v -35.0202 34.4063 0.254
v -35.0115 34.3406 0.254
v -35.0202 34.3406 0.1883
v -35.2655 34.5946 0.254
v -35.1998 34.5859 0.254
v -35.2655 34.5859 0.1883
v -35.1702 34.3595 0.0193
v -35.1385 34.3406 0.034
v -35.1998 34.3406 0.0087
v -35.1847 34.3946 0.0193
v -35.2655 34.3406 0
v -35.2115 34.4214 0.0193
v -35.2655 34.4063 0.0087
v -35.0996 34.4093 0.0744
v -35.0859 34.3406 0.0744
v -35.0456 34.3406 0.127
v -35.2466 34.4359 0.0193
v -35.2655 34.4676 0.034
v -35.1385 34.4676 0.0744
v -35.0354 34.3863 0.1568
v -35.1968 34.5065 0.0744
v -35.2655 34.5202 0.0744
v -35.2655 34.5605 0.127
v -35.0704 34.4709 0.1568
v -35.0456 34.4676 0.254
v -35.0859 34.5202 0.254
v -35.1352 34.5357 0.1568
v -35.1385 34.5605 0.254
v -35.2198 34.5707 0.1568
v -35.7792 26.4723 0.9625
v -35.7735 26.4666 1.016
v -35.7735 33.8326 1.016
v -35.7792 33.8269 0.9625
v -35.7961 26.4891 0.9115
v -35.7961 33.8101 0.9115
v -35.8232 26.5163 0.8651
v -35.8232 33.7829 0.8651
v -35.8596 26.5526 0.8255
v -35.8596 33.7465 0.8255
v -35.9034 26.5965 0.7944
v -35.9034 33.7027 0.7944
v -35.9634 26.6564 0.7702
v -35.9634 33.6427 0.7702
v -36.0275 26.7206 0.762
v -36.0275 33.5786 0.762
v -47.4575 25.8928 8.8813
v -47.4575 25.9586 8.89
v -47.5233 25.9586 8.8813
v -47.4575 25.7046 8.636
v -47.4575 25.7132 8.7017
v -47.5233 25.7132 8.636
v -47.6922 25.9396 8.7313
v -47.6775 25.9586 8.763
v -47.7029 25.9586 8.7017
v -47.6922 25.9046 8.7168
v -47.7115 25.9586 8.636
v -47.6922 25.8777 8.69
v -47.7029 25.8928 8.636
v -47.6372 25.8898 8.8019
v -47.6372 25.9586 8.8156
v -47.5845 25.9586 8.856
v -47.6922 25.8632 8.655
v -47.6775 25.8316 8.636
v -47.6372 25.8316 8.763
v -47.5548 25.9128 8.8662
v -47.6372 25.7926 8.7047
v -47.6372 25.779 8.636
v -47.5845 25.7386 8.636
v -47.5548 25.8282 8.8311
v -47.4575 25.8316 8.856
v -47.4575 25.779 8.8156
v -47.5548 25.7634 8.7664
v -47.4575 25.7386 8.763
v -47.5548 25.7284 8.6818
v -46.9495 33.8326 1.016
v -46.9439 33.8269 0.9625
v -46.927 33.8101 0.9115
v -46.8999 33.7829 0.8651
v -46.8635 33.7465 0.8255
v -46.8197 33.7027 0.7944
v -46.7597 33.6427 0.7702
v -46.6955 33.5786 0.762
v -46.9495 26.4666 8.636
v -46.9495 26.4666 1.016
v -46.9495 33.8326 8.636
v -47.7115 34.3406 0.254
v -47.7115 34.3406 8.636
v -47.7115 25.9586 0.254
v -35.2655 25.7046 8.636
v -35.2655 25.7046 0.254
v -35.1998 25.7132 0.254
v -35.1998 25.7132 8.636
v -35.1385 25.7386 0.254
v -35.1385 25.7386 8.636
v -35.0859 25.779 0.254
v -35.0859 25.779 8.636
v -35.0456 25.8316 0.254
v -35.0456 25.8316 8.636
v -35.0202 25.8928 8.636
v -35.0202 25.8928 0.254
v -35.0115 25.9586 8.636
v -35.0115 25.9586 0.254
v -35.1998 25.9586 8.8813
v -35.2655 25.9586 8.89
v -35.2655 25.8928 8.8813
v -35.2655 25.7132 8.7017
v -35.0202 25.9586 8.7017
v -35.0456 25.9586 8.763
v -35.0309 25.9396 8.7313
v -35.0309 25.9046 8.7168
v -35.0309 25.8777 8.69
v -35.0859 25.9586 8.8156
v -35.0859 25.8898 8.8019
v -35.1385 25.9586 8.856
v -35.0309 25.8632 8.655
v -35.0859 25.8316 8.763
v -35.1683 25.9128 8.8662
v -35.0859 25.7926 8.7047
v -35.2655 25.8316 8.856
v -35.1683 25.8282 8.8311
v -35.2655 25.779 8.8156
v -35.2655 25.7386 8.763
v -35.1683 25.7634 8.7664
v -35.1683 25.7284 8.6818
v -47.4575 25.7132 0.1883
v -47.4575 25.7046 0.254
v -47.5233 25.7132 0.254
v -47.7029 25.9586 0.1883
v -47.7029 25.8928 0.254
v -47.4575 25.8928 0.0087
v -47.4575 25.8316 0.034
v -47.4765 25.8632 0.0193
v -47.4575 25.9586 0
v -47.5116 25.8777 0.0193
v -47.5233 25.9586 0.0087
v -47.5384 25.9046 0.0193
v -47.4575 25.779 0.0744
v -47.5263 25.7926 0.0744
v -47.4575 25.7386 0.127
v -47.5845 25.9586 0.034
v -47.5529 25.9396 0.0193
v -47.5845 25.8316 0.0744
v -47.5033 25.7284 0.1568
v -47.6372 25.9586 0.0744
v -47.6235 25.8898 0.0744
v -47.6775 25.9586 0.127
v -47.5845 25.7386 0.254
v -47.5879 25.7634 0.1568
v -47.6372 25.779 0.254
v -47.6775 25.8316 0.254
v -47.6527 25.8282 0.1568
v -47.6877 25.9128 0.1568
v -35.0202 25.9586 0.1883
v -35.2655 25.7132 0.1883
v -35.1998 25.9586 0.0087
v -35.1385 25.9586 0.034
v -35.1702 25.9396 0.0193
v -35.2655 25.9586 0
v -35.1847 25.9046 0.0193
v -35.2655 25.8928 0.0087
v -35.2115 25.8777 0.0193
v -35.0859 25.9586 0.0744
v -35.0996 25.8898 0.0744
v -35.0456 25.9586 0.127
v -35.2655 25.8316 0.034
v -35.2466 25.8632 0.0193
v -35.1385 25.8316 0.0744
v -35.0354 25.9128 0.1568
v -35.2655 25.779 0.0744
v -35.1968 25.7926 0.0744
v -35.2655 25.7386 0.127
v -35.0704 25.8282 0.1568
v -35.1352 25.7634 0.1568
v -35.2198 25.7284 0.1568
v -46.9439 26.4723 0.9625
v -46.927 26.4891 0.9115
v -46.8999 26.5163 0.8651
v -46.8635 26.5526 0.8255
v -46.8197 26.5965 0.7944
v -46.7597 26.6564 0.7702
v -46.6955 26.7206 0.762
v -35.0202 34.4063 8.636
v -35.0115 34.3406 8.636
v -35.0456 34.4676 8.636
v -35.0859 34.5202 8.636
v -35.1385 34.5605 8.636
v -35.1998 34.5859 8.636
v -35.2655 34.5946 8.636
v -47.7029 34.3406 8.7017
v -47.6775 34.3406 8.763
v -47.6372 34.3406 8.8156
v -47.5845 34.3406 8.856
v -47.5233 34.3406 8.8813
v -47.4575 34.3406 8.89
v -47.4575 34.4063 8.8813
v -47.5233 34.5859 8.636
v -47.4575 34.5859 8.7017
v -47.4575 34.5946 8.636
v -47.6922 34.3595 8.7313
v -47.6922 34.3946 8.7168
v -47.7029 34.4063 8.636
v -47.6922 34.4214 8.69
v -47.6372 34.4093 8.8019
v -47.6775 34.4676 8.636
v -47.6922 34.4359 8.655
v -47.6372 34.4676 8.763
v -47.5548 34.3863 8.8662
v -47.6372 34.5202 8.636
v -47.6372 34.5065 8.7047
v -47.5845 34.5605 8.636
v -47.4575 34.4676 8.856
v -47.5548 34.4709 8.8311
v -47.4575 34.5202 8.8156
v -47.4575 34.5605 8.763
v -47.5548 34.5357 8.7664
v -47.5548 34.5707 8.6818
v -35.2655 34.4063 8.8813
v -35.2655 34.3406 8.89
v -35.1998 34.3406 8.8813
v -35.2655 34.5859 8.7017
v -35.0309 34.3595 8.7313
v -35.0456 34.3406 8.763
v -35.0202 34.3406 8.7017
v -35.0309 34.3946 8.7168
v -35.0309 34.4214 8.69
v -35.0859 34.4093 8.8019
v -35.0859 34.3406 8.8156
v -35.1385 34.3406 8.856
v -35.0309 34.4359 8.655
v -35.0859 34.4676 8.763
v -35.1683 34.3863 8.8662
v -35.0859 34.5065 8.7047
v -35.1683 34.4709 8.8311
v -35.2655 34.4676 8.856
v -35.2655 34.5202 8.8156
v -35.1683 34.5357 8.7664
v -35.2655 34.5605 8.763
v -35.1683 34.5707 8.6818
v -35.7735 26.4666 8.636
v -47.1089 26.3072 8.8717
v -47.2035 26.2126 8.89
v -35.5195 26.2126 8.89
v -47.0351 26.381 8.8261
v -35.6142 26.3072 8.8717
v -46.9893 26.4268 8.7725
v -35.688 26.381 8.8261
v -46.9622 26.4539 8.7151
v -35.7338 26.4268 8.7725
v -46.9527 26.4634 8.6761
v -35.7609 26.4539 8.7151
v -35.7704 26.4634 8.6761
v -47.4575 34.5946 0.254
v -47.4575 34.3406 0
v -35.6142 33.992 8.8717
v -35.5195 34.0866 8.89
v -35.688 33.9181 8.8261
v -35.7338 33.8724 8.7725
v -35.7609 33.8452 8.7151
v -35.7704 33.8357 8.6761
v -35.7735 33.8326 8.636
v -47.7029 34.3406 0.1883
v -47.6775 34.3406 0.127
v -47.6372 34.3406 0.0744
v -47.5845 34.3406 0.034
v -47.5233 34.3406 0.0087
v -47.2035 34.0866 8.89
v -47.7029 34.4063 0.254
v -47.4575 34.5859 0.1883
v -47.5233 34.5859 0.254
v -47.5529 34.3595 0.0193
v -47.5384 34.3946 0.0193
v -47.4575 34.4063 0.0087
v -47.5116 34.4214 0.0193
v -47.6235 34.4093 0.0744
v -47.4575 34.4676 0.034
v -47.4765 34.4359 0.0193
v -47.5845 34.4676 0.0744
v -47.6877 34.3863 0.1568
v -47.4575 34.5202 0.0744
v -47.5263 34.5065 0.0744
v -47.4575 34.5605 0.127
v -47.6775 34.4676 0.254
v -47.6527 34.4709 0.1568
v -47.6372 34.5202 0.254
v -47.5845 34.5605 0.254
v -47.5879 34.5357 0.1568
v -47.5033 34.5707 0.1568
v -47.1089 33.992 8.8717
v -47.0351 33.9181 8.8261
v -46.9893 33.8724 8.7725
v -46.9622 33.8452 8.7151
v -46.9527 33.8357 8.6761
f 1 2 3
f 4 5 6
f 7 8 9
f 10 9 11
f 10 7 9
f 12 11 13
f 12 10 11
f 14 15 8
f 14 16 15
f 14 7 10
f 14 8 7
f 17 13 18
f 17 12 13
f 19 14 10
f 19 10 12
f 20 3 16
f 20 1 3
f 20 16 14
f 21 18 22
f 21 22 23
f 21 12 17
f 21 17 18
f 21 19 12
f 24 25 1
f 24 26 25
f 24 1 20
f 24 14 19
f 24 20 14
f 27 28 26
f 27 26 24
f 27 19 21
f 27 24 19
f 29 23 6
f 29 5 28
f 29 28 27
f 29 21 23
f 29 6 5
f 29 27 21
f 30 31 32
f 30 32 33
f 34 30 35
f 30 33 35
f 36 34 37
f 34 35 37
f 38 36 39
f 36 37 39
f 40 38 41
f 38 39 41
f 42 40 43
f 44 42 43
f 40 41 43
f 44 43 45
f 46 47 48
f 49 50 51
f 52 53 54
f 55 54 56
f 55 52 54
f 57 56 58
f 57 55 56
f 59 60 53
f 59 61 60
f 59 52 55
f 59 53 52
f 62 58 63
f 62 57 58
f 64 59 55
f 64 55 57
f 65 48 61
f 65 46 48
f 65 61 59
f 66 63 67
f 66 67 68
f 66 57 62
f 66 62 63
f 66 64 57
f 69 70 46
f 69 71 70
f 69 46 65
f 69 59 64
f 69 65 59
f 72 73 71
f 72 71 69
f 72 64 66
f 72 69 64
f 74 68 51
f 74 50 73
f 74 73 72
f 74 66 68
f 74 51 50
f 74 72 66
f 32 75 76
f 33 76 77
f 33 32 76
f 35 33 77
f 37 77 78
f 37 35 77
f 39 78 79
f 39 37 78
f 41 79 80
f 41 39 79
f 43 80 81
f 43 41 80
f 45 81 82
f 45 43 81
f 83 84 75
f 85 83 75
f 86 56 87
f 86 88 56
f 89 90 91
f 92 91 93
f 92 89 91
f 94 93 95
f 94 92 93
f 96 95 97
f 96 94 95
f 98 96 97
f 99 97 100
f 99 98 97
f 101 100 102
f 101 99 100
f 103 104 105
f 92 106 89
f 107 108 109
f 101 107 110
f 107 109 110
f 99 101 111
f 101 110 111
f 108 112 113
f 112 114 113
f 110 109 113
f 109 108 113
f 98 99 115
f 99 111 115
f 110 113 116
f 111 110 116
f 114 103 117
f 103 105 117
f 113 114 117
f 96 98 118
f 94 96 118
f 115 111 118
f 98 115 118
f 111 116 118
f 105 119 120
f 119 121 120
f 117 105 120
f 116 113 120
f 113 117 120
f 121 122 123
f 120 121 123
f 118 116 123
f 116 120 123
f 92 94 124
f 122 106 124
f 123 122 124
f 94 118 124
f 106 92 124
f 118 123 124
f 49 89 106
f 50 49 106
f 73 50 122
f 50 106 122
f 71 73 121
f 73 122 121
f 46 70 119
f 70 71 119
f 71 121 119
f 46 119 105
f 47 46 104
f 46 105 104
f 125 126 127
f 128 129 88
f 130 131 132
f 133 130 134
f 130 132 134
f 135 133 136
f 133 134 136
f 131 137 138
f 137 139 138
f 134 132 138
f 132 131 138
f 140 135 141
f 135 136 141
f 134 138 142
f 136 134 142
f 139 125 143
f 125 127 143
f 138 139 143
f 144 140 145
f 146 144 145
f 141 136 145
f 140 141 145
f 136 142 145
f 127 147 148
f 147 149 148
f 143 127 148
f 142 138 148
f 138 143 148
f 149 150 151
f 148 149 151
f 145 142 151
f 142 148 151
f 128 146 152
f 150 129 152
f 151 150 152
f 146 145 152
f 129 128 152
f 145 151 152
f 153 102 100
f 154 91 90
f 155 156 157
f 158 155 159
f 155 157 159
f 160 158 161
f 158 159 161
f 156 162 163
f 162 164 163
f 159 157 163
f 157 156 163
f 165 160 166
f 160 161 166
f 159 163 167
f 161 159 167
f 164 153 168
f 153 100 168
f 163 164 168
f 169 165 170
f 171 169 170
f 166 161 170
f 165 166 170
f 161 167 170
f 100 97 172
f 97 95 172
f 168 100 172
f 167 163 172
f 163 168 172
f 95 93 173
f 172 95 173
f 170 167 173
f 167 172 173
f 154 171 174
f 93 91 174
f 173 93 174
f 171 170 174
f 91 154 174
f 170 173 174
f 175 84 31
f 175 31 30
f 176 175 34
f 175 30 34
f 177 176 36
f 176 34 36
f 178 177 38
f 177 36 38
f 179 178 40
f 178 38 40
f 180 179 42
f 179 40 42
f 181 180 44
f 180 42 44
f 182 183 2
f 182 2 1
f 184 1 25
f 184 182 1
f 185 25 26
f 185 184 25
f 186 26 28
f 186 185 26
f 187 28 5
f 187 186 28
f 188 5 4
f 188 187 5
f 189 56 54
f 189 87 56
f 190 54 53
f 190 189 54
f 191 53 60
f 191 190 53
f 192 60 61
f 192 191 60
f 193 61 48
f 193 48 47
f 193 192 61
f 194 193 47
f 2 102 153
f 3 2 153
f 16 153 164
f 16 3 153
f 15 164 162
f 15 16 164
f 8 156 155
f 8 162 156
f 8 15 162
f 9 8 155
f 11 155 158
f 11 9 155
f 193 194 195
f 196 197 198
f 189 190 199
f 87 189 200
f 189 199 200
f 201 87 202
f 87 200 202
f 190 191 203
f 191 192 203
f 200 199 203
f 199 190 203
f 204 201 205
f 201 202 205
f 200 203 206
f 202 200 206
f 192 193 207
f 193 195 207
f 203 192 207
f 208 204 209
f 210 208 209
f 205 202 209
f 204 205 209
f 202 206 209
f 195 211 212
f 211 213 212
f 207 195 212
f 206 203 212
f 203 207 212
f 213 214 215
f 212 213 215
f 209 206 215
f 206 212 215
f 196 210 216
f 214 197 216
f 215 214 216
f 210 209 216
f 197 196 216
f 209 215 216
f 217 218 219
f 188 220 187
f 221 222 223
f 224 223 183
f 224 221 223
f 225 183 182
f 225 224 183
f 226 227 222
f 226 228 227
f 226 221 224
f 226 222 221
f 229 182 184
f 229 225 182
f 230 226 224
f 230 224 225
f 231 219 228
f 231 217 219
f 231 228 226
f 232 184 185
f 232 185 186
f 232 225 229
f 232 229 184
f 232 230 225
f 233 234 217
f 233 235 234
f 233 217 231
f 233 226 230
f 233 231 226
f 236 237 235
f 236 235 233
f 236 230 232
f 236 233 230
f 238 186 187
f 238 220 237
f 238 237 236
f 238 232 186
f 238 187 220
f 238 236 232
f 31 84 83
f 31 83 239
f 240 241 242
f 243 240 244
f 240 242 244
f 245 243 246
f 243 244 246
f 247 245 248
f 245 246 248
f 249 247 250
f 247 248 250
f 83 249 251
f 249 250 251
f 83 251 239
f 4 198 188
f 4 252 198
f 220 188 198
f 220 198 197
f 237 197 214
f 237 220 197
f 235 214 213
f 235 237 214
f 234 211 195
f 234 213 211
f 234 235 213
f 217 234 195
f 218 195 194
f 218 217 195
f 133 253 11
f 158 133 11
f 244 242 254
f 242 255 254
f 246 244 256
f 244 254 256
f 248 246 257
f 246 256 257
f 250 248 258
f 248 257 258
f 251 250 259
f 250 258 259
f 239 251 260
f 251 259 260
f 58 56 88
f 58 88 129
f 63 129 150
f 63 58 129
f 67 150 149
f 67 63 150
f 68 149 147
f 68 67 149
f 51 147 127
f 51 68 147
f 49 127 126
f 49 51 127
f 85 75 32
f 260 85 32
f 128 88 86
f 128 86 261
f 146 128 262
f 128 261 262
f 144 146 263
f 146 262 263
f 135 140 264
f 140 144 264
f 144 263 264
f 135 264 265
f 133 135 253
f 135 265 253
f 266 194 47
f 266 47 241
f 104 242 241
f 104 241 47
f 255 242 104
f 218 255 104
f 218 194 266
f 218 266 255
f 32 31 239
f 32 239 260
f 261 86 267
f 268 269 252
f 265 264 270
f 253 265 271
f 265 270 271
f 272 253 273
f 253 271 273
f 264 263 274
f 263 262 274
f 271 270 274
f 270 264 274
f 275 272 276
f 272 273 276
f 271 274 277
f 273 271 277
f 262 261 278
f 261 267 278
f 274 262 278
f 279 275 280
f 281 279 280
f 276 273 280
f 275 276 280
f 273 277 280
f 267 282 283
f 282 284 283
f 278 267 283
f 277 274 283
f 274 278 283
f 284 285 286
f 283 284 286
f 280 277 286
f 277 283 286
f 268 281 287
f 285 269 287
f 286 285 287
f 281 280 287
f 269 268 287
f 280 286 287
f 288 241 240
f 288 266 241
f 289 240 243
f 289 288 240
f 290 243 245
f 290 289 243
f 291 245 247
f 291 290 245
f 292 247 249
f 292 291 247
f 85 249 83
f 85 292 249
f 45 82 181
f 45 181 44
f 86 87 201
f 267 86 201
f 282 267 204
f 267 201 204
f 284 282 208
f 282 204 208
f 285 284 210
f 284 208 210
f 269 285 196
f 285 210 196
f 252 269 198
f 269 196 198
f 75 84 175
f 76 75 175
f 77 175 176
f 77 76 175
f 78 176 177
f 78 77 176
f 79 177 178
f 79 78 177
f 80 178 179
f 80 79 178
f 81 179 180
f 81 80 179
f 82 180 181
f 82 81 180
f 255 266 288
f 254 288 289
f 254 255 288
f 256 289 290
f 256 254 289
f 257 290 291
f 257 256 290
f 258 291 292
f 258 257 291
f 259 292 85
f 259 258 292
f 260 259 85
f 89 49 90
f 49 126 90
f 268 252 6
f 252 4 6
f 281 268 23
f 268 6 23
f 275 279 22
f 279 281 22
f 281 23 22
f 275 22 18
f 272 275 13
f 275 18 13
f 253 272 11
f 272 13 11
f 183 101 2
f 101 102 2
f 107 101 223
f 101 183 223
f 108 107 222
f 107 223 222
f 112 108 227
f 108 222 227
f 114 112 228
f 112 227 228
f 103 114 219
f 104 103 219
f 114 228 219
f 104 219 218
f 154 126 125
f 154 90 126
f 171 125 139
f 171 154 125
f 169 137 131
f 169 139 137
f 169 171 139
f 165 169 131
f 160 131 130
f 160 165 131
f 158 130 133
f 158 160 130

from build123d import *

# Parameters (mm, degrees)
F0_W     = 12.7
F0_H     = 8.89
F1_DEPTH = 8.89
F2_T     = -0.762
F3_R     = 0.254
F4_R     = 0.254


with BuildPart() as f1:
    # F0 (on Top) → F1 (new body)
    with BuildSketch(Plane.XY):
        with Locations((-41.3615499459, 30.1495660652)):
            Rectangle(F0_W, F0_H)
    extrude(amount=F1_DEPTH)

    # F2
    f2_openings = [f1.faces().sort_by_distance(p)[0] for p in [
        (-41.36155, 30.149566, 8.89),
    ]]
    offset(amount=F2_T, openings=f2_openings)

    # F3
    f3_edges = [f1.edges().sort_by_distance(p)[0] for p in [
        (-41.36155, 33.832566, 8.89),
        (-41.36155, 25.704566, 8.89),
        (-41.36155, 26.466566, 8.89),
        (-41.36155, 34.594566, 8.89),
        (-46.94955, 30.149566, 8.89),
        (-47.71155, 30.149566, 8.89),
        (-35.77355, 30.149566, 8.89),
        (-35.01155, 30.149566, 8.89),
        (-35.01155, 25.704566, 4.445),
        (-47.71155, 25.704566, 4.445),
        (-47.71155, 34.594566, 4.445),
        (-35.01155, 34.594566, 4.445),
        (-35.01155, 30.149566, 0),
        (-41.36155, 25.704566, 0),
        (-47.71155, 30.149566, 0),
        (-41.36155, 34.594566, 0),
    ]]
    fillet(f3_edges, radius=F3_R)

    # F4
    f4_edges = [f1.edges().sort_by_distance(p)[0] for p in [
        (-41.36155, 33.832566, 0.762),
        (-35.77355, 30.149566, 0.762),
        (-41.36155, 26.466566, 0.762),
        (-46.94955, 30.149566, 0.762),
    ]]
    fillet(f4_edges, radius=F4_R)


solid = f1.part
